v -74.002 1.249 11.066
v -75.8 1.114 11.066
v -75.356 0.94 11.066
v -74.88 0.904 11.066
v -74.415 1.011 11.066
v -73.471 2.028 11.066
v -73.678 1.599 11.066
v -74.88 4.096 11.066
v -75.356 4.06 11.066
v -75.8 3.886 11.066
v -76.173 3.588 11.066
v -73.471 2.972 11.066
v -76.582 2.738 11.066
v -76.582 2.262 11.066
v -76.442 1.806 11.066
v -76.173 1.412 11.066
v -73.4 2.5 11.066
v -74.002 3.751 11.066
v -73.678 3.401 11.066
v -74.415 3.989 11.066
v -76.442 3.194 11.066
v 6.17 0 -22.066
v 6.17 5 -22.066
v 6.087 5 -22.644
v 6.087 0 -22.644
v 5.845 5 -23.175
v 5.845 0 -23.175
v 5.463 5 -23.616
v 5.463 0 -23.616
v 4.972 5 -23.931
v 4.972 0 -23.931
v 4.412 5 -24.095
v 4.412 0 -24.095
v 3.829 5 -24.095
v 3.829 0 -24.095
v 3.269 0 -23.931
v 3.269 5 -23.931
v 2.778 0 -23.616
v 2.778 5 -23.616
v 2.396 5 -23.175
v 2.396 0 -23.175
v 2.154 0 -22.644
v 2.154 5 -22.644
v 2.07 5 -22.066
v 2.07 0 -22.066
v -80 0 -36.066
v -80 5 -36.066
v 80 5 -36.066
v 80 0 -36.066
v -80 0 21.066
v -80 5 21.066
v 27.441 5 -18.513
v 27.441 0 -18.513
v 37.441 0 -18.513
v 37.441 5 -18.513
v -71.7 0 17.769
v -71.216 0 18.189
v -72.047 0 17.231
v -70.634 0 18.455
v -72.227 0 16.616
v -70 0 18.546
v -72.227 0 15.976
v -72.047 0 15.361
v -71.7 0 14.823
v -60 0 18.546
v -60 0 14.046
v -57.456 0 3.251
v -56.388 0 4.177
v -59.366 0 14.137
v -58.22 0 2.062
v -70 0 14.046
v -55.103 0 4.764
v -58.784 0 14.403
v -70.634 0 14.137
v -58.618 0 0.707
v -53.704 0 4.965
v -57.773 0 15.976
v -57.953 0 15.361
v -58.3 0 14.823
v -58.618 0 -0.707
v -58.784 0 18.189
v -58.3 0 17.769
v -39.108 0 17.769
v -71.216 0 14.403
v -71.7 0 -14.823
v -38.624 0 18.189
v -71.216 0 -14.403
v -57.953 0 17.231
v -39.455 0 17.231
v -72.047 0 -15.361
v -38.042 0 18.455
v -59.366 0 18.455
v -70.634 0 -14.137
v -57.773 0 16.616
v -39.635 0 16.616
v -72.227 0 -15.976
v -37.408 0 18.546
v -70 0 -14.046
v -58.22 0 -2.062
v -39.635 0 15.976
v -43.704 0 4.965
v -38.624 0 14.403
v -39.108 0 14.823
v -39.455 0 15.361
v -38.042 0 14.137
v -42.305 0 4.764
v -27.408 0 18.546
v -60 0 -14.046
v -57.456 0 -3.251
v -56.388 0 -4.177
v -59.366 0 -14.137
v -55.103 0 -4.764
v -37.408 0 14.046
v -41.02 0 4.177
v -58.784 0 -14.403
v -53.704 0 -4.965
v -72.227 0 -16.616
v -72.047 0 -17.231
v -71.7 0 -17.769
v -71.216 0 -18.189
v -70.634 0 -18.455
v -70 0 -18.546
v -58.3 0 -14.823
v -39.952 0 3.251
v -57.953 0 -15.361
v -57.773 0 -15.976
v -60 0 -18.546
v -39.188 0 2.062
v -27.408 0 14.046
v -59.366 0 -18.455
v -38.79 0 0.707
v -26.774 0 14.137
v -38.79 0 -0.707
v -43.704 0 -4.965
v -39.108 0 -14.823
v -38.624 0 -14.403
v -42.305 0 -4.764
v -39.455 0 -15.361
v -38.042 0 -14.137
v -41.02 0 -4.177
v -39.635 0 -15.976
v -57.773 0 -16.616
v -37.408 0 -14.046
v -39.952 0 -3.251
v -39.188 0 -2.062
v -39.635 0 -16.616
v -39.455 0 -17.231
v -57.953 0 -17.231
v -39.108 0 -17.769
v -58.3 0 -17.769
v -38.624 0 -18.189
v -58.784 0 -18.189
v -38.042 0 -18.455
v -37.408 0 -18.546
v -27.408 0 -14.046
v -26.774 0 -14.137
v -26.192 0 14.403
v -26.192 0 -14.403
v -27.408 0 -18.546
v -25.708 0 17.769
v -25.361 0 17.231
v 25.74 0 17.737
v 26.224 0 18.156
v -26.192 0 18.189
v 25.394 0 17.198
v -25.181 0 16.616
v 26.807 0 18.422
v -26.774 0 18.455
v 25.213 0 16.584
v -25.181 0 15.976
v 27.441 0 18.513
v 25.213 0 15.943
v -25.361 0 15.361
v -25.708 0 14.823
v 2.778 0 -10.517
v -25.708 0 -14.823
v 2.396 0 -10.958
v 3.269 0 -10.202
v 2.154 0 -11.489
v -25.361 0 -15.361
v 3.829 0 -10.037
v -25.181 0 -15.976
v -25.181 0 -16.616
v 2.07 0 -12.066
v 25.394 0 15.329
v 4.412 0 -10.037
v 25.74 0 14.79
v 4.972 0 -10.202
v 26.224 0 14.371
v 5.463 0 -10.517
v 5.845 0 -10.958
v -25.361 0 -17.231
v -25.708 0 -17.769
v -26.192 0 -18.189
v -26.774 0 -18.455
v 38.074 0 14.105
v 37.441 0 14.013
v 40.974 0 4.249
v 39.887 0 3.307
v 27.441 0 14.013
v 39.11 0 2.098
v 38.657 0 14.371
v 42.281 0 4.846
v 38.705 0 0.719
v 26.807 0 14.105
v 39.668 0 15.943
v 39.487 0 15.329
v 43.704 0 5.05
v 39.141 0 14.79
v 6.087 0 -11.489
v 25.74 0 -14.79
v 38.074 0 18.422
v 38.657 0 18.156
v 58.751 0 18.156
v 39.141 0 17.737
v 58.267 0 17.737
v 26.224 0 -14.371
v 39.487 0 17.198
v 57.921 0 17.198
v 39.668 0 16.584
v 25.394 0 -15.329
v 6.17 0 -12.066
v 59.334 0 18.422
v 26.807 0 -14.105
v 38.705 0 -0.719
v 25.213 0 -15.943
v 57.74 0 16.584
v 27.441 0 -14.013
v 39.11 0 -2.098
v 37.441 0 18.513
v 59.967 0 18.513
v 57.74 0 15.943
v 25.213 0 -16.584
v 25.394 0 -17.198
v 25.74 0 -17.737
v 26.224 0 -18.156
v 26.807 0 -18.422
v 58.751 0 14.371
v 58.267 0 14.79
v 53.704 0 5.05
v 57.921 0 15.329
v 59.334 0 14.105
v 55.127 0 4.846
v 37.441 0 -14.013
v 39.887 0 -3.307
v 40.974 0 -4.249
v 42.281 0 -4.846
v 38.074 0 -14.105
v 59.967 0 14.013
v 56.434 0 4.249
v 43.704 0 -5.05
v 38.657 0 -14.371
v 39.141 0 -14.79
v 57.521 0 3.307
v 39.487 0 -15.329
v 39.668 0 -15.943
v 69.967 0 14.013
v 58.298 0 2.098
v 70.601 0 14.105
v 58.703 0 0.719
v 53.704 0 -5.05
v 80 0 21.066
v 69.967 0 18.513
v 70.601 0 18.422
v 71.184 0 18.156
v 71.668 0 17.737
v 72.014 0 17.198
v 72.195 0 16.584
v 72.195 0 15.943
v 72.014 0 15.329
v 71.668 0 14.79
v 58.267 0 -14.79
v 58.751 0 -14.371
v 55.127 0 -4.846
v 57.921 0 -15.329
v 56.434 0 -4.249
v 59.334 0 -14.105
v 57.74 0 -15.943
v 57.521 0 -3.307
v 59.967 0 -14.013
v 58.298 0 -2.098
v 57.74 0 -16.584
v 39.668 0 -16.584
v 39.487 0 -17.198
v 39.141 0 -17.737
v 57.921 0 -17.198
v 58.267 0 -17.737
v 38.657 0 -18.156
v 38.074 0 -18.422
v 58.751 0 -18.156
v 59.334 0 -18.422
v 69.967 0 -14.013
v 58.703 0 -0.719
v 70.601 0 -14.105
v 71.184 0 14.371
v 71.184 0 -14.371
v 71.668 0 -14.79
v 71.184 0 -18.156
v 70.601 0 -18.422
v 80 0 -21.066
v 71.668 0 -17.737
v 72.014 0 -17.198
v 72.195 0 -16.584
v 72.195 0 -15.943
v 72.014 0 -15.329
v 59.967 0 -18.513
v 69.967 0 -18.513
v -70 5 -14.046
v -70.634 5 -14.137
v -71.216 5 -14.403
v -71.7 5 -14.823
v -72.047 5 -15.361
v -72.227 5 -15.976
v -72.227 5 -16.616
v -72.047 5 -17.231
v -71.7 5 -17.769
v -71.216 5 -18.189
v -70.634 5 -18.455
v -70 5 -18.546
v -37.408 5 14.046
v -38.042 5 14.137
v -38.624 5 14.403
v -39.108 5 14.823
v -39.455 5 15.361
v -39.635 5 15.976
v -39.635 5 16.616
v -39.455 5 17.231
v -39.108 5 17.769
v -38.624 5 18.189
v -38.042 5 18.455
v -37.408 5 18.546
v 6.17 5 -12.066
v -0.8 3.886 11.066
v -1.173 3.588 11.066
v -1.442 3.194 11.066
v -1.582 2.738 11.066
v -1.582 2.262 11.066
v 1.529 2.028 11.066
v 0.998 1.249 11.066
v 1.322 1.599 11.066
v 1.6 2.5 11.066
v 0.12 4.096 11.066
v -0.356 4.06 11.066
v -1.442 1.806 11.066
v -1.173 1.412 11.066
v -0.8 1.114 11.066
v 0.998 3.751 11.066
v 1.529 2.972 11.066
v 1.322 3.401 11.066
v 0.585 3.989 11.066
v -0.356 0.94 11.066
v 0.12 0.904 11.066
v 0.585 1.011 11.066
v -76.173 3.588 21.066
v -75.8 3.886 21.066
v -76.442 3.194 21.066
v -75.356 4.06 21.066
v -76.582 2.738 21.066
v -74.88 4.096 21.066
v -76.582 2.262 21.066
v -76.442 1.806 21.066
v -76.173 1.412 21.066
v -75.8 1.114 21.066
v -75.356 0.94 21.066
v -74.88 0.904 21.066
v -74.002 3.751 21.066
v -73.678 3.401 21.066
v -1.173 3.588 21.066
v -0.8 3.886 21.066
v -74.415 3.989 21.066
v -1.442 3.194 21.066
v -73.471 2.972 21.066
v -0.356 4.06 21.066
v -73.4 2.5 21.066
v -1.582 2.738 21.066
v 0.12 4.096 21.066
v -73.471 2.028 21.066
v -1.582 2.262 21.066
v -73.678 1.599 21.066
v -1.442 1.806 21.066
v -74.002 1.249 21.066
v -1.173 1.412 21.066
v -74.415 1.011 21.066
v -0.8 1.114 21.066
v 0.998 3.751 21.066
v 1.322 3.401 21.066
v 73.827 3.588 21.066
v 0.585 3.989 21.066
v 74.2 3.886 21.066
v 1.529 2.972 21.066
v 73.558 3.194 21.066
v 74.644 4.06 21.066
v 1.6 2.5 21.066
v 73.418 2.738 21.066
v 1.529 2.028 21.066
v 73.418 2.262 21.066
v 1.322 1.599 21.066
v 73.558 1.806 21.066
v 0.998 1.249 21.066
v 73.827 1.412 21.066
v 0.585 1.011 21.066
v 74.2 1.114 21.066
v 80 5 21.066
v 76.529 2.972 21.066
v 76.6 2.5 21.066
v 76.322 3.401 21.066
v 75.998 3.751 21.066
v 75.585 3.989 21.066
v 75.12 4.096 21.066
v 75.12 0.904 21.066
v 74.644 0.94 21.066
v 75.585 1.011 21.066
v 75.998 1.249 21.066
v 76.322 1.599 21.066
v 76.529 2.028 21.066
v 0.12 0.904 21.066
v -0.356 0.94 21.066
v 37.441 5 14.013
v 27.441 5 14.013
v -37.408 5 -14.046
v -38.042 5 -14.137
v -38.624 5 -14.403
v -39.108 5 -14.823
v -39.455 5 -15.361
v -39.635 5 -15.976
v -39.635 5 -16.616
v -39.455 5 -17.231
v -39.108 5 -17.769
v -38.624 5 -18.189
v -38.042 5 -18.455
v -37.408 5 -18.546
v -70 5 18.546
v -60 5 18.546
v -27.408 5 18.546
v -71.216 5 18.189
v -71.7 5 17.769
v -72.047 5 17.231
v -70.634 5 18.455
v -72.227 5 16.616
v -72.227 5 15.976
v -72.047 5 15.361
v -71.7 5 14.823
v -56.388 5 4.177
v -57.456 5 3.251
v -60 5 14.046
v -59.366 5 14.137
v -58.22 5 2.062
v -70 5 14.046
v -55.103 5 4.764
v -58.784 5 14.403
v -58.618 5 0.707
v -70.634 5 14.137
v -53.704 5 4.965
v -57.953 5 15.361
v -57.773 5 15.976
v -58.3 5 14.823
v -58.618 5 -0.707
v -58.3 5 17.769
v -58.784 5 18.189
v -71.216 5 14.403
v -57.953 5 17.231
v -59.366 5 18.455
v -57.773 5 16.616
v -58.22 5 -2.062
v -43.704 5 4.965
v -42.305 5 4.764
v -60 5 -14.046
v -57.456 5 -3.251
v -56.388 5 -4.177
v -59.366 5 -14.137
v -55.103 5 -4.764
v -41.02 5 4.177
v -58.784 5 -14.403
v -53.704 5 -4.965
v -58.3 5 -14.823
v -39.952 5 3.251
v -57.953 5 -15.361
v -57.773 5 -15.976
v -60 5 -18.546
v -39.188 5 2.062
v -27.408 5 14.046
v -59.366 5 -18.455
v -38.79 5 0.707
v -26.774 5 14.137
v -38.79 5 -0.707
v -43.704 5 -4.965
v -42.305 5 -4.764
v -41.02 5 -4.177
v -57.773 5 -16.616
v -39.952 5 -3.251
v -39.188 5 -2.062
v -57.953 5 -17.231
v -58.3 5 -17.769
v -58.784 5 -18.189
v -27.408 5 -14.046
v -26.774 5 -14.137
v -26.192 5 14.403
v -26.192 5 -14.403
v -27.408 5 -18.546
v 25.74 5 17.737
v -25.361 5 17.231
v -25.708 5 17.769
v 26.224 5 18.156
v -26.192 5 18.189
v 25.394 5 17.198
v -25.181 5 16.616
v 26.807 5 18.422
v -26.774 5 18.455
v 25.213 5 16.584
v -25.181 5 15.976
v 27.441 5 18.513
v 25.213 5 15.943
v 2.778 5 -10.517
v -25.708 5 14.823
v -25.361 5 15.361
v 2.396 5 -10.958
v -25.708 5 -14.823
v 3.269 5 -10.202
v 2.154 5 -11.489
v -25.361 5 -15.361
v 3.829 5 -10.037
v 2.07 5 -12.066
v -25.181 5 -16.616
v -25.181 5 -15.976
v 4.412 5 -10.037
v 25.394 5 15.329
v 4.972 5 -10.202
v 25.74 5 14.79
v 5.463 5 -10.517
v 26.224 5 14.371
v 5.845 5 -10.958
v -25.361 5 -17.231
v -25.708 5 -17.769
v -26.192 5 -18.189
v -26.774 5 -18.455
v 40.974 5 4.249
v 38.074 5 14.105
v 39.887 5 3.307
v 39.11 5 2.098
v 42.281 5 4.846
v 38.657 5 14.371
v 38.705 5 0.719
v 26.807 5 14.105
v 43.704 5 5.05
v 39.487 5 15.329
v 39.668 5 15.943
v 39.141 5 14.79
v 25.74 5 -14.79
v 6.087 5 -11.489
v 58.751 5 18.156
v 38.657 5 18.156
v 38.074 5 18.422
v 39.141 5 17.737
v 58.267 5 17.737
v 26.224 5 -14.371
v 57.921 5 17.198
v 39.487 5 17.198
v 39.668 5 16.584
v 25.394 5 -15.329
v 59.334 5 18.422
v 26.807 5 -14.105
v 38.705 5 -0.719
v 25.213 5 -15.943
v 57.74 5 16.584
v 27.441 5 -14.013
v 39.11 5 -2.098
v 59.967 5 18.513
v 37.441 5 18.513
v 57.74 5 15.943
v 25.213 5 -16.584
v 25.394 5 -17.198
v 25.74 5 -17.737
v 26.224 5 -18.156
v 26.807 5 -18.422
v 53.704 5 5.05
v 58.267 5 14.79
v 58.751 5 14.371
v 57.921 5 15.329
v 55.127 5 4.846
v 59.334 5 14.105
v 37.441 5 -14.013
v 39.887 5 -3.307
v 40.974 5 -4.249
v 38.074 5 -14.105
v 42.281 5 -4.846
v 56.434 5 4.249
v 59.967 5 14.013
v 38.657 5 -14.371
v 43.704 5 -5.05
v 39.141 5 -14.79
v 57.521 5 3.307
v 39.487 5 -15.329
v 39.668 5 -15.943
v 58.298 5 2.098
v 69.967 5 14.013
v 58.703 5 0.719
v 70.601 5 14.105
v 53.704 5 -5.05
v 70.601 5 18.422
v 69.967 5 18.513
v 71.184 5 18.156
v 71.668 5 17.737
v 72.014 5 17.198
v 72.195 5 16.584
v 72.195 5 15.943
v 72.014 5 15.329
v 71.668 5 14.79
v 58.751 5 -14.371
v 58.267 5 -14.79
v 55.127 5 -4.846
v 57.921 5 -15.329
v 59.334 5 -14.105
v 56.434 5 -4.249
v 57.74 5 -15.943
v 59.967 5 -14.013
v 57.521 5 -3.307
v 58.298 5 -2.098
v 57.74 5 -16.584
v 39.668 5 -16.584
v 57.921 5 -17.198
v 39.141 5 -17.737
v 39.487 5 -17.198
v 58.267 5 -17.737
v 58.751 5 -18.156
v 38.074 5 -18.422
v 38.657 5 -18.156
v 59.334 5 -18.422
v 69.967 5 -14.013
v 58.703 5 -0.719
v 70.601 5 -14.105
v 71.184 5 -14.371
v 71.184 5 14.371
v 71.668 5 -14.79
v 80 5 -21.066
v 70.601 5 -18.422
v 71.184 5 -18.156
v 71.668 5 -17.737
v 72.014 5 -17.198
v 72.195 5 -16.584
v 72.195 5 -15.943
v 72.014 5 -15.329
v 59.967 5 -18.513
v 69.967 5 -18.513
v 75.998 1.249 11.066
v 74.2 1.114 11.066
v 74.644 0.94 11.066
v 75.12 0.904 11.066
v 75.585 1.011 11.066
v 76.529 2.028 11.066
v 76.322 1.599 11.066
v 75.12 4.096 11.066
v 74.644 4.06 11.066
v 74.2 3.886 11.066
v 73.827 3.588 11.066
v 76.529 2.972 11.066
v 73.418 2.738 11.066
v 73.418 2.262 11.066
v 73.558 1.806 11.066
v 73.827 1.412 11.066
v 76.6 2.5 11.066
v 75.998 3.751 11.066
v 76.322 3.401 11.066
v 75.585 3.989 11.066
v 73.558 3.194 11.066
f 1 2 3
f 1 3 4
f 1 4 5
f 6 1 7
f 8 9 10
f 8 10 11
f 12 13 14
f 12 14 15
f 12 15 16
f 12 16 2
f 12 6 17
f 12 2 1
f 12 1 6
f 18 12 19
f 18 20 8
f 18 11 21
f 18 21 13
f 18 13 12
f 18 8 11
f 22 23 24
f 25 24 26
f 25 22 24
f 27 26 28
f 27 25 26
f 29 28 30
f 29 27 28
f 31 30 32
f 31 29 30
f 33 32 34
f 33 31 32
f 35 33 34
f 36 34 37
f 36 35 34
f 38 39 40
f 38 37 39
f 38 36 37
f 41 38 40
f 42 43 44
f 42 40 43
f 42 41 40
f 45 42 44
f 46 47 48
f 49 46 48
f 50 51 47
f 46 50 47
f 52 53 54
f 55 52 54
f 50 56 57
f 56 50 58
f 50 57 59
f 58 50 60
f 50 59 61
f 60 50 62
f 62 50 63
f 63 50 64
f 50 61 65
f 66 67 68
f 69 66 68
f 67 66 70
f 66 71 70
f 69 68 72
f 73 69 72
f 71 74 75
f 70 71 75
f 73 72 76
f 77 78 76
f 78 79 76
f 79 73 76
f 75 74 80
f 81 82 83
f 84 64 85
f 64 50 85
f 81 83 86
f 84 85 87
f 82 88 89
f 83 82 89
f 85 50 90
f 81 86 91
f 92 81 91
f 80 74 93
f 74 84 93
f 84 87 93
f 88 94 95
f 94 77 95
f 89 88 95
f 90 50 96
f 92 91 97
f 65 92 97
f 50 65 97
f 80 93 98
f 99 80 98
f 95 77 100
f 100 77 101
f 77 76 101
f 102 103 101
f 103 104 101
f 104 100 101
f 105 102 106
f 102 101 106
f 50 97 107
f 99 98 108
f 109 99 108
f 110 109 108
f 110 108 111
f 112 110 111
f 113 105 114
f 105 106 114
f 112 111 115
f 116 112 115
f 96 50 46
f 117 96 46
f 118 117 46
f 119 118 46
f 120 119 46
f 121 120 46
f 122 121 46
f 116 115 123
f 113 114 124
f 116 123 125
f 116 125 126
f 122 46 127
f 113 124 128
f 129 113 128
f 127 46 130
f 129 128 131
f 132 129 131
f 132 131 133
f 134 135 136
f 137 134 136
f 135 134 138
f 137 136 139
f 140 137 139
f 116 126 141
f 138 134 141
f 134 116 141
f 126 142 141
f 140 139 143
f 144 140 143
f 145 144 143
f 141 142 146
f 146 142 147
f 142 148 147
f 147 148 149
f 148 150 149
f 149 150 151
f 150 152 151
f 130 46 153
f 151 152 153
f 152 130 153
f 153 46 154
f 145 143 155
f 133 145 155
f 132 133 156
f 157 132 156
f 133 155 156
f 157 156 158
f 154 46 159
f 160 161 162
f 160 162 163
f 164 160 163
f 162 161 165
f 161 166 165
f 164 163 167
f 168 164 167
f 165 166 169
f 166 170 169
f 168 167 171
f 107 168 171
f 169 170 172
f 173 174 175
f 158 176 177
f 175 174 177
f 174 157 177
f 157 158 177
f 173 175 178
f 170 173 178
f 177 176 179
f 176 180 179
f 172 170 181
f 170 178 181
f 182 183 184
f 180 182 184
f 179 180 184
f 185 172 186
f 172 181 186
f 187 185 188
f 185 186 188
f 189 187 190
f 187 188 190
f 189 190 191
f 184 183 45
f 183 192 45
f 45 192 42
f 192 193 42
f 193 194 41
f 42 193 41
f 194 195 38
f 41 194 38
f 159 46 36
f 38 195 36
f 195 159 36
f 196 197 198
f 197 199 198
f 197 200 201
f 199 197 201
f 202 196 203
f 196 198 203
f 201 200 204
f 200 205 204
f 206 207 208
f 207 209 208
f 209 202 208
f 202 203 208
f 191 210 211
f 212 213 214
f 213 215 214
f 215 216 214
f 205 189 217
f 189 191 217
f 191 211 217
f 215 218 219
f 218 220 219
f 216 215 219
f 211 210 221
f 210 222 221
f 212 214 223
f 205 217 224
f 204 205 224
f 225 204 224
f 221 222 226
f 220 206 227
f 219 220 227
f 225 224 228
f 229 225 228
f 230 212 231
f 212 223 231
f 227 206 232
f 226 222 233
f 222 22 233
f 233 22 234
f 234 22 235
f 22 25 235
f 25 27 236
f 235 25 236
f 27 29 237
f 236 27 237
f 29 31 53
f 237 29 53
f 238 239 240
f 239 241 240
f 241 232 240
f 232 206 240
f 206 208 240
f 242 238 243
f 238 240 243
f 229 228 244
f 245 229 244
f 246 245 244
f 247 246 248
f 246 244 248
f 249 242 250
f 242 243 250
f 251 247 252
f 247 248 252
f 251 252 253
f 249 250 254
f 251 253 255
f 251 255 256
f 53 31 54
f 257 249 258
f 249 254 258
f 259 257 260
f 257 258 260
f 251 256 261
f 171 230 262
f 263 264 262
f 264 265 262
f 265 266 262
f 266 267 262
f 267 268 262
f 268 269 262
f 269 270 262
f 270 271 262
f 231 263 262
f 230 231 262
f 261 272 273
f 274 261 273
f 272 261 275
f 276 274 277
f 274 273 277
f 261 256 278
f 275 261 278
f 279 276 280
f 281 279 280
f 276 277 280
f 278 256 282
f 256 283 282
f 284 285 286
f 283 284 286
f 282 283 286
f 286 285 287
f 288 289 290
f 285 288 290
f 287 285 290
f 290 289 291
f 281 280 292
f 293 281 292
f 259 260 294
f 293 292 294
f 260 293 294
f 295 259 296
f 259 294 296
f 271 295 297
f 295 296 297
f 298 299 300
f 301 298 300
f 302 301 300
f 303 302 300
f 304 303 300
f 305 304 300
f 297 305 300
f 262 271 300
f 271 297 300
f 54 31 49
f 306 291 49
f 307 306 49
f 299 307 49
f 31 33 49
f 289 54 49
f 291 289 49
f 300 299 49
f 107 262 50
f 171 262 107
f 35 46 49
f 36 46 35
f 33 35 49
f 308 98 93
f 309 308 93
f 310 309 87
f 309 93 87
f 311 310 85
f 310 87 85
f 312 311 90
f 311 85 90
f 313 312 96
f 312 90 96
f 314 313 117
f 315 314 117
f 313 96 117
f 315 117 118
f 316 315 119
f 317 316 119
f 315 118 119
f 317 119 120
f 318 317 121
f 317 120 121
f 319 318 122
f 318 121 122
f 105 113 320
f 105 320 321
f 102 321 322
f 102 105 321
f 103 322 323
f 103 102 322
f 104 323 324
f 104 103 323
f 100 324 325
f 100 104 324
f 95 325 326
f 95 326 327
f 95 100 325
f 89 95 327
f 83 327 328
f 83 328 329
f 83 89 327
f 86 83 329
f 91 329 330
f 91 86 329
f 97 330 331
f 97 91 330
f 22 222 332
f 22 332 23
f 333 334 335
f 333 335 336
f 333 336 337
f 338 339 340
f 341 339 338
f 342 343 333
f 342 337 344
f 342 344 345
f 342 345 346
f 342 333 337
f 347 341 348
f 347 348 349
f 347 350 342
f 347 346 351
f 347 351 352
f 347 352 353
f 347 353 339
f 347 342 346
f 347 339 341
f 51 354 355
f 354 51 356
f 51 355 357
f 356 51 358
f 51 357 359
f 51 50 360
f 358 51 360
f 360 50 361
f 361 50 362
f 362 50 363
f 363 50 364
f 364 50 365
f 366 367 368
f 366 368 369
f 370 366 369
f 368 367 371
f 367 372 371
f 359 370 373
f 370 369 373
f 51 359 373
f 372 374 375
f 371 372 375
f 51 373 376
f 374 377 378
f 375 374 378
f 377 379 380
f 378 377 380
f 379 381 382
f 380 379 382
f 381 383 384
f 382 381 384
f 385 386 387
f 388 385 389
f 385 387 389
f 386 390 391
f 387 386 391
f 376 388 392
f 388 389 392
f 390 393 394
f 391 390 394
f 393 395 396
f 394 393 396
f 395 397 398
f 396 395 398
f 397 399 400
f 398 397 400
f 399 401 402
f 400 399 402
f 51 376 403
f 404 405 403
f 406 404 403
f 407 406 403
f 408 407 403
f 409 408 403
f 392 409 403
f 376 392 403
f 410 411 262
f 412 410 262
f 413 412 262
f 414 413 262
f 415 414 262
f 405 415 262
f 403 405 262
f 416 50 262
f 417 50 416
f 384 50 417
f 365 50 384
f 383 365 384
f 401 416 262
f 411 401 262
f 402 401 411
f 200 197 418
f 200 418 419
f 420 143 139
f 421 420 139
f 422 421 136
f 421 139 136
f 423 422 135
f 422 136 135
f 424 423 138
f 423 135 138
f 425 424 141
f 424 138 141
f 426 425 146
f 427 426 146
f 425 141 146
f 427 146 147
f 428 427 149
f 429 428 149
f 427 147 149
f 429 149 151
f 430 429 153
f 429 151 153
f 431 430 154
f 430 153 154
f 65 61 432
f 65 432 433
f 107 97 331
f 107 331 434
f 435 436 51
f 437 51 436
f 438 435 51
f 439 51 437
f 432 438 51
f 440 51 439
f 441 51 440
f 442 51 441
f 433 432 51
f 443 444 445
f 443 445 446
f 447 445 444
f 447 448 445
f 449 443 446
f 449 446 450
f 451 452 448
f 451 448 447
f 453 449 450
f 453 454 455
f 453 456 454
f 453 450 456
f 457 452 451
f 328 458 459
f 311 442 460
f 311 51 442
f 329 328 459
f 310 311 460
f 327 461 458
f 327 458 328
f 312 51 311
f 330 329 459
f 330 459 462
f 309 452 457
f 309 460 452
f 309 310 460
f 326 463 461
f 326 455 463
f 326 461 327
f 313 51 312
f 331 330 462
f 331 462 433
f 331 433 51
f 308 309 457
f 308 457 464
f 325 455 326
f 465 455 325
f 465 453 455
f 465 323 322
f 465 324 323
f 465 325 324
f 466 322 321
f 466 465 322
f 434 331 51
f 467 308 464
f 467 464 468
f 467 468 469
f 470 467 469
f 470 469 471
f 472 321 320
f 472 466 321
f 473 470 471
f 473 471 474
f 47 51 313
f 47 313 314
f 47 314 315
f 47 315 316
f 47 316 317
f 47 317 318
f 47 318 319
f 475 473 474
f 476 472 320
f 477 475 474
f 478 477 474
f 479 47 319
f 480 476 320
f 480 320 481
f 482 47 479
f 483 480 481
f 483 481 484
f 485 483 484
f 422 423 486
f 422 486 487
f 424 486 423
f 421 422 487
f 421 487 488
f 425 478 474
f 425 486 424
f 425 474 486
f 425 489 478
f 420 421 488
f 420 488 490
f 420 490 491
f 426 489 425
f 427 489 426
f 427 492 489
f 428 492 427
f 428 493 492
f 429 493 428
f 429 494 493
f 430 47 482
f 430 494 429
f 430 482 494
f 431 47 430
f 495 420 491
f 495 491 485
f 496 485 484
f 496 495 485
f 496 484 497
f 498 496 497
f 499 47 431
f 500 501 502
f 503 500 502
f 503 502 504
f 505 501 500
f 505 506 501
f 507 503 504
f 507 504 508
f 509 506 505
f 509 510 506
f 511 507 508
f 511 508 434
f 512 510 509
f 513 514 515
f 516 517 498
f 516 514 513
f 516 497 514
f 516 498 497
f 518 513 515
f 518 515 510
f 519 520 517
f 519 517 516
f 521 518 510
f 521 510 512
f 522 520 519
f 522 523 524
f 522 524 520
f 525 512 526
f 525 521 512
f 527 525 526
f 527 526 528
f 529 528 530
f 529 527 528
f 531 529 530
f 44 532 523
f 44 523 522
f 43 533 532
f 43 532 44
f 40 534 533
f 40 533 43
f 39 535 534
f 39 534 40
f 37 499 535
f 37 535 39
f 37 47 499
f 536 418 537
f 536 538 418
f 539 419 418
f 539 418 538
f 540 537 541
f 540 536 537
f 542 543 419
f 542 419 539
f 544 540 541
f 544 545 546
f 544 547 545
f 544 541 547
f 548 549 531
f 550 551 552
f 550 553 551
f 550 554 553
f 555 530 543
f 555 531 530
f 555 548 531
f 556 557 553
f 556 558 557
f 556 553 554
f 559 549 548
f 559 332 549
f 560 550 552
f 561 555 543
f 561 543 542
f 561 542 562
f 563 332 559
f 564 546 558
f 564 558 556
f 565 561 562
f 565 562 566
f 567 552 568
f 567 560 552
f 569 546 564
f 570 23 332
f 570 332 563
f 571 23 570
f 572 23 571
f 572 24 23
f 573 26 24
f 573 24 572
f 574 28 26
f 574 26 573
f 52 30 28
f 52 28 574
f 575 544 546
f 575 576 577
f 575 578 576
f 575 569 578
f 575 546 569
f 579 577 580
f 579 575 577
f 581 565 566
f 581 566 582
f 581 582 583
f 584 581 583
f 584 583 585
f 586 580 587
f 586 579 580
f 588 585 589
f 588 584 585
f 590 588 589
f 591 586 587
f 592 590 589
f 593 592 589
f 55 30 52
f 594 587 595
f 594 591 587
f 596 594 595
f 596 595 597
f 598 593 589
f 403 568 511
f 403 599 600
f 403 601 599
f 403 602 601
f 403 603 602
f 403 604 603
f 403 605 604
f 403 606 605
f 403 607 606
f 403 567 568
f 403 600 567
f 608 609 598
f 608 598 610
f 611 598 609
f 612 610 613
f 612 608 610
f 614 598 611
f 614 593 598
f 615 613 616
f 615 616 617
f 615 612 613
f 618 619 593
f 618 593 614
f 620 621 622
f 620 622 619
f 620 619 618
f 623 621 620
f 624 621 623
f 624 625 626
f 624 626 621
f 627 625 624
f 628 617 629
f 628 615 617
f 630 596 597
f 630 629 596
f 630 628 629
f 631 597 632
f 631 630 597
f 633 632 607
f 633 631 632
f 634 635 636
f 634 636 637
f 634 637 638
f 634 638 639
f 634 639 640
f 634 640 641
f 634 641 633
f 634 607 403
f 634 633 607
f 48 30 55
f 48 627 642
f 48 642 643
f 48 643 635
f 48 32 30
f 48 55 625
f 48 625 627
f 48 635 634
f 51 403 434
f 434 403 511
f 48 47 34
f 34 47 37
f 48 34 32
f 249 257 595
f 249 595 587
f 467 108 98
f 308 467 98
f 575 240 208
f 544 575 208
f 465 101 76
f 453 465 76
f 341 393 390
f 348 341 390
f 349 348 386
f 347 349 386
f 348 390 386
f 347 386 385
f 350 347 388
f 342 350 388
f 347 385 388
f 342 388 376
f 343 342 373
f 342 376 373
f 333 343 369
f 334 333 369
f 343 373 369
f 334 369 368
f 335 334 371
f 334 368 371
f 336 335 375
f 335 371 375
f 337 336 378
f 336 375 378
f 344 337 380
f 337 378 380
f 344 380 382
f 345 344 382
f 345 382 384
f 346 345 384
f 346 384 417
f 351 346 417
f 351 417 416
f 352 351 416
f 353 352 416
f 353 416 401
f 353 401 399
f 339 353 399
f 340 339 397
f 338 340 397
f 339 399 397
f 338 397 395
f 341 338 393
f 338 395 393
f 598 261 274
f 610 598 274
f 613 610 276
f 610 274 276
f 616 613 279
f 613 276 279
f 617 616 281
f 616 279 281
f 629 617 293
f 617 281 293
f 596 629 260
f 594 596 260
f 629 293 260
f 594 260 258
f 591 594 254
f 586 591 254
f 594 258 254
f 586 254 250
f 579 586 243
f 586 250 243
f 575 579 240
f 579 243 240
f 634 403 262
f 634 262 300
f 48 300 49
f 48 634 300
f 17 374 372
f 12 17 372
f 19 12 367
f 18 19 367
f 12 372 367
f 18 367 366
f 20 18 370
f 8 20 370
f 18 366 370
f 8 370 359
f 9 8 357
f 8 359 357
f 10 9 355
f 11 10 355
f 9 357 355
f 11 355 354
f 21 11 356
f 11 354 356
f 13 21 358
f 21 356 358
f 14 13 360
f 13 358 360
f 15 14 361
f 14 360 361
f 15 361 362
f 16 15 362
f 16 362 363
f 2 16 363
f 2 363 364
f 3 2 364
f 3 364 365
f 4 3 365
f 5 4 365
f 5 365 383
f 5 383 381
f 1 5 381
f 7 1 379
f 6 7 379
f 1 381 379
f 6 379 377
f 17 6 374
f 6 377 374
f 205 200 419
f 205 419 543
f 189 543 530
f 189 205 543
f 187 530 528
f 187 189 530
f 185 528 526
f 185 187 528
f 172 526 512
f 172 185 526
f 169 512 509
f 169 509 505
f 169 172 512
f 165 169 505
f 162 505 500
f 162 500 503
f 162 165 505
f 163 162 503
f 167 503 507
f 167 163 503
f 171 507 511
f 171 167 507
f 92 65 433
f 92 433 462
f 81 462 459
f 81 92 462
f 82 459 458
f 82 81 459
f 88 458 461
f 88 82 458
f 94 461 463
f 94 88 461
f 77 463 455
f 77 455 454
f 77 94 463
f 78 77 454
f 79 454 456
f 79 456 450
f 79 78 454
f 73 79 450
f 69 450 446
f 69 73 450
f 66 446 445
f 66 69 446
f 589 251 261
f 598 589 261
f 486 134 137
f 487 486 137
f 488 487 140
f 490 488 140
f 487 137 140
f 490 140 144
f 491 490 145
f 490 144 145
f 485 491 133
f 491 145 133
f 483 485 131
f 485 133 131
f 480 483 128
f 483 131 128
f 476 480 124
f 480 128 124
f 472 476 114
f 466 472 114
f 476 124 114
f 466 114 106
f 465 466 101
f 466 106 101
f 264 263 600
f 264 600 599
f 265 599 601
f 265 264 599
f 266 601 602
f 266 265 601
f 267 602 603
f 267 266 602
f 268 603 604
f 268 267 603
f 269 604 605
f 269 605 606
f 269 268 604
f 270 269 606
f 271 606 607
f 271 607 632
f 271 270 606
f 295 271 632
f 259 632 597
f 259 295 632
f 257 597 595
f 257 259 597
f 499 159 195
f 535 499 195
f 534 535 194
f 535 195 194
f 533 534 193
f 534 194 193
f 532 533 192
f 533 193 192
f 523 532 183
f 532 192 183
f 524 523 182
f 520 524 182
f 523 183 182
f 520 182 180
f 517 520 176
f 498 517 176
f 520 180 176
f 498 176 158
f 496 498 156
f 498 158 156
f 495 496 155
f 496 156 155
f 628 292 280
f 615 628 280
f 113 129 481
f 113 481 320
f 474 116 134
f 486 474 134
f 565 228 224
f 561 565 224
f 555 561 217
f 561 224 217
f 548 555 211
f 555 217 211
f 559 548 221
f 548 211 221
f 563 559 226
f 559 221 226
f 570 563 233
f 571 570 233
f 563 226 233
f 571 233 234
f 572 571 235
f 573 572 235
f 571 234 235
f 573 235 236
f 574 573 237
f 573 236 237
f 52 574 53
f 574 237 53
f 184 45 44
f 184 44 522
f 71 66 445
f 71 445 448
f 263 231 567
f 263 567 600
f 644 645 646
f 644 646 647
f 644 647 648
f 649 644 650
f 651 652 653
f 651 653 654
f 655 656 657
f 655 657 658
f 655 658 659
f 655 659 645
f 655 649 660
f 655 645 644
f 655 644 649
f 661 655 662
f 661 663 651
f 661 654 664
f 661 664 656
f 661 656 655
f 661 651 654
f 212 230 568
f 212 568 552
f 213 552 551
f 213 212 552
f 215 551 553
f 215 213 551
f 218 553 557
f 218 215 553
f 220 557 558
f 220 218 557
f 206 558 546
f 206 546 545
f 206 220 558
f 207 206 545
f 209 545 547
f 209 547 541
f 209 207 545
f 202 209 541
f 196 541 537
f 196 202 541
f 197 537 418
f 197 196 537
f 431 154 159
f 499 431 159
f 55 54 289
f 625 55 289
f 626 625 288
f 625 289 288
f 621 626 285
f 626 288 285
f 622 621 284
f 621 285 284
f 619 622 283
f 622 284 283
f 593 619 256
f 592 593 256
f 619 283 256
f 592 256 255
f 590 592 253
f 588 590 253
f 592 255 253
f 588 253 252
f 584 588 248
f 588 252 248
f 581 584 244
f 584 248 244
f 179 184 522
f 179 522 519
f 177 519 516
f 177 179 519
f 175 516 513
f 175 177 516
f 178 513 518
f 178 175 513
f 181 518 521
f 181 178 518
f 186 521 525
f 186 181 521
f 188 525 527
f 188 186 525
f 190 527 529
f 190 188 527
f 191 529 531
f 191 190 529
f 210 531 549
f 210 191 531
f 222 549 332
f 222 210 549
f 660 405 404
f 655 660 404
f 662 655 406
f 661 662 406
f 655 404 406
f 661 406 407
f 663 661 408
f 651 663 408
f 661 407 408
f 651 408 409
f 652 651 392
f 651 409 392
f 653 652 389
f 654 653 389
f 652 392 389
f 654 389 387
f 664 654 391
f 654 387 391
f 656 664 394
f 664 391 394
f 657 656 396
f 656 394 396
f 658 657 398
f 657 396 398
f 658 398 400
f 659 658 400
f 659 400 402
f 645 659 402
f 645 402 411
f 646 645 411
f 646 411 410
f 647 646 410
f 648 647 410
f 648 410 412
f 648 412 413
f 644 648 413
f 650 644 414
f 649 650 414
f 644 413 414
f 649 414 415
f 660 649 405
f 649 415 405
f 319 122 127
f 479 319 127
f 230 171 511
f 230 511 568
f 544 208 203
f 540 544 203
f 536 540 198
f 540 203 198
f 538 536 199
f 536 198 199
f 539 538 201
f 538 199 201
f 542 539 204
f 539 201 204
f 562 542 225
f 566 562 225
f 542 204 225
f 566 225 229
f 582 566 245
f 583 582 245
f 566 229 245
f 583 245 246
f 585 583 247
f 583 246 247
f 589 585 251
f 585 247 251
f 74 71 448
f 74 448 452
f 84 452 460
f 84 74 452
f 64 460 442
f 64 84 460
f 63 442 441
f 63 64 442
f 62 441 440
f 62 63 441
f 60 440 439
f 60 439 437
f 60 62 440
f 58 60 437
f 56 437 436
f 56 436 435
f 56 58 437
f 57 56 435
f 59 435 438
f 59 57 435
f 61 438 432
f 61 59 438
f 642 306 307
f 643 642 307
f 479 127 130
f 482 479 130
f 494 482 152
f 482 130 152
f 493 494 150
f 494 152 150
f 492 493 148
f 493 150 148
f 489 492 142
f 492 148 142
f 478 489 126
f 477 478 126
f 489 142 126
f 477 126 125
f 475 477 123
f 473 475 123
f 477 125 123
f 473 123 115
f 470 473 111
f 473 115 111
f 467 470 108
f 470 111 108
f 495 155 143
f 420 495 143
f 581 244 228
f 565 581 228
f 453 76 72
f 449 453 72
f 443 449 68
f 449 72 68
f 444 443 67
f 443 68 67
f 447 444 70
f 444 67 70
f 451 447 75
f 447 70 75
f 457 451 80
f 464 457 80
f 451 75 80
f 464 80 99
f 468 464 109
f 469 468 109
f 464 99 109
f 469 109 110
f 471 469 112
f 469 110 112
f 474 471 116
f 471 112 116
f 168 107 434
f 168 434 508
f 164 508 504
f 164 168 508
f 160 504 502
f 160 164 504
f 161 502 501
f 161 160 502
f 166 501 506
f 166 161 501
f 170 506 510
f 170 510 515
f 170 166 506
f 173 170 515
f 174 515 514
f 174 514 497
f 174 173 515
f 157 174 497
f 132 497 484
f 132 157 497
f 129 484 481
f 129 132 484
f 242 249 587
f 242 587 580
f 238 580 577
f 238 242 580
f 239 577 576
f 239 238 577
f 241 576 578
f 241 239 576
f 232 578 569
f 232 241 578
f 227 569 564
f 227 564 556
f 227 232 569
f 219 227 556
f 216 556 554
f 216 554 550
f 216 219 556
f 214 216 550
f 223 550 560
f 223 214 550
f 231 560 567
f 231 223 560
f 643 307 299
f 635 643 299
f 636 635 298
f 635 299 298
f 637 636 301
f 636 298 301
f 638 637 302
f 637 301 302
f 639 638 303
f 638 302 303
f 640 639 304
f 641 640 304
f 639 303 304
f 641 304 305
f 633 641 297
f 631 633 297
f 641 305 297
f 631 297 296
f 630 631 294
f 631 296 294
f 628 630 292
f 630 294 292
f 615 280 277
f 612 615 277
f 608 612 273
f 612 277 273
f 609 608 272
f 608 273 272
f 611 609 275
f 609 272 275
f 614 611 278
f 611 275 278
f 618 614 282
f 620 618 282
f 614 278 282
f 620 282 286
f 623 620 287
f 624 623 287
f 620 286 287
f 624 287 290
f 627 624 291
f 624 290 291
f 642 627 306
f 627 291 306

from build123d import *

# Parameters (mm, degrees)
SKETCH1_W           = 159.999999944
SKETCH1_H           = 42.132527592
BOSS_EXTRUDE1_DEPTH = 5
SKETCH4_R           = 1.6
CUT_EXTRUDE2_DEPTH  = 10
CUT_EXTRUDE4_DEPTH  = 6
SKETCH10_W          = 160
SKETCH10_H          = 10
BOSS_EXTRUDE4_DEPTH = 5
CUT_EXTRUDE5_DEPTH  = 6
SKETCH11_W          = 160
SKETCH11_H          = 5
BOSS_EXTRUDE5_DEPTH = 5


with BuildPart() as part:
    # Sketch1 → Boss-Extrude1 (new body)
    with BuildSketch(Plane(origin=(0, 0, 0), x_dir=(1, 0, 0), z_dir=(0, 1, 0))):
        Rectangle(SKETCH1_W, SKETCH1_H)
        with BuildLine():
            Line((-69.999999972, 18.546018972), (-59.999999972, 18.546018972))
            ThreePointArc((-59.999999972, 18.546018972), (-57.749999972, 16.296018972), (-59.999999972, 14.046018972))
            Line((-59.999999972, 14.046018972), (-69.999999972, 14.046018972))
            ThreePointArc((-69.999999972, 14.046018972), (-72.249999972, 16.296018972), (-69.999999972, 18.546018972))
        make_face(mode=Mode.SUBTRACT)
        with BuildLine():
            Line((-37.407962028, 18.546018972), (-27.407962028, 18.546018972))
            ThreePointArc((-27.407962028, 18.546018972), (-25.157962028, 16.296018972), (-27.407962028, 14.046018972))
            Line((-27.407962028, 14.046018972), (-37.407962028, 14.046018972))
            ThreePointArc((-37.407962028, 14.046018972), (-39.657962028, 16.296018972), (-37.407962028, 18.546018972))
        make_face(mode=Mode.SUBTRACT)
        with BuildLine():
            Line((-69.999999972, -18.546018972), (-59.999999972, -18.546018972))
            ThreePointArc((-59.999999972, -18.546018972), (-57.749999972, -16.296018972), (-59.999999972, -14.046018972))
            Line((-59.999999972, -14.046018972), (-69.999999972, -14.046018972))
            ThreePointArc((-69.999999972, -14.046018972), (-72.249999972, -16.296018972), (-69.999999972, -18.546018972))
        make_face(mode=Mode.SUBTRACT)
        with BuildLine():
            Line((-37.407962028, -18.546018972), (-27.407962028, -18.546018972))
            ThreePointArc((-27.407962028, -18.546018972), (-25.157962028, -16.296018972), (-27.407962028, -14.046018972))
            Line((-27.407962028, -14.046018972), (-37.407962028, -14.046018972))
            ThreePointArc((-37.407962028, -14.046018972), (-39.657962028, -16.296018972), (-37.407962028, -18.546018972))
        make_face(mode=Mode.SUBTRACT)
        with BuildLine():
            Line((-53.703981, 4.964699858), (-43.703981, 4.964699858))
            ThreePointArc((-43.703981, 4.964699858), (-38.739281142, 0), (-43.703981, -4.964699858))
            Line((-43.703981, -4.964699858), (-53.703981, -4.964699858))
            ThreePointArc((-53.703981, -4.964699858), (-58.668680858, 0), (-53.703981, 4.964699858))
        make_face(mode=Mode.SUBTRACT)
        with BuildLine():
            Line((37.440525033, 14.013455967), (27.440525033, 14.013455967))
            ThreePointArc((27.440525033, 14.013455967), (25.190525033, 16.263455967), (27.440525033, 18.513455967))
            Line((27.440525033, 18.513455967), (37.440525033, 18.513455967))
            ThreePointArc((37.440525033, 18.513455967), (39.690525033, 16.263455967), (37.440525033, 14.013455967))
        make_face(mode=Mode.SUBTRACT)
        with BuildLine():
            Line((69.967436967, 14.013455967), (59.967436967, 14.013455967))
            ThreePointArc((59.967436967, 14.013455967), (57.717436967, 16.263455967), (59.967436967, 18.513455967))
            Line((59.967436967, 18.513455967), (69.967436967, 18.513455967))
            ThreePointArc((69.967436967, 18.513455967), (72.217436967, 16.263455967), (69.967436967, 14.013455967))
        make_face(mode=Mode.SUBTRACT)
        with BuildLine():
            Line((53.703981, -5.050207727), (43.703981, -5.050207727))
            ThreePointArc((43.703981, -5.050207727), (38.653773273, 0), (43.703981, 5.050207727))
            Line((43.703981, 5.050207727), (53.703981, 5.050207727))
            ThreePointArc((53.703981, 5.050207727), (58.754188727, 0), (53.703981, -5.050207727))
        make_face(mode=Mode.SUBTRACT)
        with BuildLine():
            Line((37.440525033, -14.013455967), (27.440525033, -14.013455967))
            ThreePointArc((27.440525033, -14.013455967), (25.190525033, -16.263455967), (27.440525033, -18.513455967))
            Line((27.440525033, -18.513455967), (37.440525033, -18.513455967))
            ThreePointArc((37.440525033, -18.513455967), (39.690525033, -16.263455967), (37.440525033, -14.013455967))
        make_face(mode=Mode.SUBTRACT)
        with BuildLine():
            Line((69.967436967, -14.013455967), (59.967436967, -14.013455967))
            ThreePointArc((59.967436967, -14.013455967), (57.717436967, -16.263455967), (59.967436967, -18.513455967))
            Line((59.967436967, -18.513455967), (69.967436967, -18.513455967))
            ThreePointArc((69.967436967, -18.513455967), (72.217436967, -16.263455967), (69.967436967, -14.013455967))
        make_face(mode=Mode.SUBTRACT)
    extrude(amount=BOSS_EXTRUDE1_DEPTH)

    # Sketch4 → Cut-Extrude2 (cut)
    with BuildSketch(Plane.XY.offset(21.066263796)):
        with Locations((-74.999999972, 2.5)):
            Circle(SKETCH4_R)
        with Locations((74.999999972, 2.5)):
            Circle(SKETCH4_R)
        with Locations((0, 2.5)):
            Circle(SKETCH4_R)
    extrude(amount=-CUT_EXTRUDE2_DEPTH, mode=Mode.SUBTRACT)

    # Sketch9 → Cut-Extrude4 (cut, through all)
    with BuildSketch(Plane.XZ):
        with BuildLine():
            Line((2.070498026, -22.066263796), (2.070498026, -12.066263796))
            ThreePointArc((2.070498026, -12.066263796), (4.120498026, -10.016263796), (6.170498026, -12.066263796))
            Line((6.170498026, -12.066263796), (6.170498026, -22.066263796))
            ThreePointArc((6.170498026, -22.066263796), (4.120498026, -24.116263796), (2.070498026, -22.066263796))
        make_face()
    extrude(amount=-CUT_EXTRUDE4_DEPTH, mode=Mode.SUBTRACT)

    # Sketch10 → Boss-Extrude4 (add)
    with BuildSketch(Plane(origin=(0, 5, 0), x_dir=(1, 0, 0), z_dir=(0, 1, 0))):
        with Locations((2.8e-08, 26.066263796)):
            Rectangle(SKETCH10_W, SKETCH10_H)
    extrude(amount=-BOSS_EXTRUDE4_DEPTH)

    # Sketch9<2> → Cut-Extrude5 (cut, through all)
    with BuildSketch(Plane.XZ):
        with BuildLine():
            Line((2.070498026, -22.066263796), (2.070498026, -12.066263796))
            ThreePointArc((2.070498026, -12.066263796), (4.120498026, -10.016263796), (6.170498026, -12.066263796))
            Line((6.170498026, -12.066263796), (6.170498026, -22.066263796))
            ThreePointArc((6.170498026, -22.066263796), (4.120498026, -24.116263796), (2.070498026, -22.066263796))
        make_face()
    extrude(amount=-CUT_EXTRUDE5_DEPTH, mode=Mode.SUBTRACT)

    # Sketch11 → Boss-Extrude5 (add)
    with BuildSketch(Plane(origin=(0, 5, 0), x_dir=(1, 0, 0), z_dir=(0, 1, 0))):
        with Locations((2.8e-08, 33.566263796)):
            Rectangle(SKETCH11_W, SKETCH11_H)
    extrude(amount=-BOSS_EXTRUDE5_DEPTH)


solid = part.part
